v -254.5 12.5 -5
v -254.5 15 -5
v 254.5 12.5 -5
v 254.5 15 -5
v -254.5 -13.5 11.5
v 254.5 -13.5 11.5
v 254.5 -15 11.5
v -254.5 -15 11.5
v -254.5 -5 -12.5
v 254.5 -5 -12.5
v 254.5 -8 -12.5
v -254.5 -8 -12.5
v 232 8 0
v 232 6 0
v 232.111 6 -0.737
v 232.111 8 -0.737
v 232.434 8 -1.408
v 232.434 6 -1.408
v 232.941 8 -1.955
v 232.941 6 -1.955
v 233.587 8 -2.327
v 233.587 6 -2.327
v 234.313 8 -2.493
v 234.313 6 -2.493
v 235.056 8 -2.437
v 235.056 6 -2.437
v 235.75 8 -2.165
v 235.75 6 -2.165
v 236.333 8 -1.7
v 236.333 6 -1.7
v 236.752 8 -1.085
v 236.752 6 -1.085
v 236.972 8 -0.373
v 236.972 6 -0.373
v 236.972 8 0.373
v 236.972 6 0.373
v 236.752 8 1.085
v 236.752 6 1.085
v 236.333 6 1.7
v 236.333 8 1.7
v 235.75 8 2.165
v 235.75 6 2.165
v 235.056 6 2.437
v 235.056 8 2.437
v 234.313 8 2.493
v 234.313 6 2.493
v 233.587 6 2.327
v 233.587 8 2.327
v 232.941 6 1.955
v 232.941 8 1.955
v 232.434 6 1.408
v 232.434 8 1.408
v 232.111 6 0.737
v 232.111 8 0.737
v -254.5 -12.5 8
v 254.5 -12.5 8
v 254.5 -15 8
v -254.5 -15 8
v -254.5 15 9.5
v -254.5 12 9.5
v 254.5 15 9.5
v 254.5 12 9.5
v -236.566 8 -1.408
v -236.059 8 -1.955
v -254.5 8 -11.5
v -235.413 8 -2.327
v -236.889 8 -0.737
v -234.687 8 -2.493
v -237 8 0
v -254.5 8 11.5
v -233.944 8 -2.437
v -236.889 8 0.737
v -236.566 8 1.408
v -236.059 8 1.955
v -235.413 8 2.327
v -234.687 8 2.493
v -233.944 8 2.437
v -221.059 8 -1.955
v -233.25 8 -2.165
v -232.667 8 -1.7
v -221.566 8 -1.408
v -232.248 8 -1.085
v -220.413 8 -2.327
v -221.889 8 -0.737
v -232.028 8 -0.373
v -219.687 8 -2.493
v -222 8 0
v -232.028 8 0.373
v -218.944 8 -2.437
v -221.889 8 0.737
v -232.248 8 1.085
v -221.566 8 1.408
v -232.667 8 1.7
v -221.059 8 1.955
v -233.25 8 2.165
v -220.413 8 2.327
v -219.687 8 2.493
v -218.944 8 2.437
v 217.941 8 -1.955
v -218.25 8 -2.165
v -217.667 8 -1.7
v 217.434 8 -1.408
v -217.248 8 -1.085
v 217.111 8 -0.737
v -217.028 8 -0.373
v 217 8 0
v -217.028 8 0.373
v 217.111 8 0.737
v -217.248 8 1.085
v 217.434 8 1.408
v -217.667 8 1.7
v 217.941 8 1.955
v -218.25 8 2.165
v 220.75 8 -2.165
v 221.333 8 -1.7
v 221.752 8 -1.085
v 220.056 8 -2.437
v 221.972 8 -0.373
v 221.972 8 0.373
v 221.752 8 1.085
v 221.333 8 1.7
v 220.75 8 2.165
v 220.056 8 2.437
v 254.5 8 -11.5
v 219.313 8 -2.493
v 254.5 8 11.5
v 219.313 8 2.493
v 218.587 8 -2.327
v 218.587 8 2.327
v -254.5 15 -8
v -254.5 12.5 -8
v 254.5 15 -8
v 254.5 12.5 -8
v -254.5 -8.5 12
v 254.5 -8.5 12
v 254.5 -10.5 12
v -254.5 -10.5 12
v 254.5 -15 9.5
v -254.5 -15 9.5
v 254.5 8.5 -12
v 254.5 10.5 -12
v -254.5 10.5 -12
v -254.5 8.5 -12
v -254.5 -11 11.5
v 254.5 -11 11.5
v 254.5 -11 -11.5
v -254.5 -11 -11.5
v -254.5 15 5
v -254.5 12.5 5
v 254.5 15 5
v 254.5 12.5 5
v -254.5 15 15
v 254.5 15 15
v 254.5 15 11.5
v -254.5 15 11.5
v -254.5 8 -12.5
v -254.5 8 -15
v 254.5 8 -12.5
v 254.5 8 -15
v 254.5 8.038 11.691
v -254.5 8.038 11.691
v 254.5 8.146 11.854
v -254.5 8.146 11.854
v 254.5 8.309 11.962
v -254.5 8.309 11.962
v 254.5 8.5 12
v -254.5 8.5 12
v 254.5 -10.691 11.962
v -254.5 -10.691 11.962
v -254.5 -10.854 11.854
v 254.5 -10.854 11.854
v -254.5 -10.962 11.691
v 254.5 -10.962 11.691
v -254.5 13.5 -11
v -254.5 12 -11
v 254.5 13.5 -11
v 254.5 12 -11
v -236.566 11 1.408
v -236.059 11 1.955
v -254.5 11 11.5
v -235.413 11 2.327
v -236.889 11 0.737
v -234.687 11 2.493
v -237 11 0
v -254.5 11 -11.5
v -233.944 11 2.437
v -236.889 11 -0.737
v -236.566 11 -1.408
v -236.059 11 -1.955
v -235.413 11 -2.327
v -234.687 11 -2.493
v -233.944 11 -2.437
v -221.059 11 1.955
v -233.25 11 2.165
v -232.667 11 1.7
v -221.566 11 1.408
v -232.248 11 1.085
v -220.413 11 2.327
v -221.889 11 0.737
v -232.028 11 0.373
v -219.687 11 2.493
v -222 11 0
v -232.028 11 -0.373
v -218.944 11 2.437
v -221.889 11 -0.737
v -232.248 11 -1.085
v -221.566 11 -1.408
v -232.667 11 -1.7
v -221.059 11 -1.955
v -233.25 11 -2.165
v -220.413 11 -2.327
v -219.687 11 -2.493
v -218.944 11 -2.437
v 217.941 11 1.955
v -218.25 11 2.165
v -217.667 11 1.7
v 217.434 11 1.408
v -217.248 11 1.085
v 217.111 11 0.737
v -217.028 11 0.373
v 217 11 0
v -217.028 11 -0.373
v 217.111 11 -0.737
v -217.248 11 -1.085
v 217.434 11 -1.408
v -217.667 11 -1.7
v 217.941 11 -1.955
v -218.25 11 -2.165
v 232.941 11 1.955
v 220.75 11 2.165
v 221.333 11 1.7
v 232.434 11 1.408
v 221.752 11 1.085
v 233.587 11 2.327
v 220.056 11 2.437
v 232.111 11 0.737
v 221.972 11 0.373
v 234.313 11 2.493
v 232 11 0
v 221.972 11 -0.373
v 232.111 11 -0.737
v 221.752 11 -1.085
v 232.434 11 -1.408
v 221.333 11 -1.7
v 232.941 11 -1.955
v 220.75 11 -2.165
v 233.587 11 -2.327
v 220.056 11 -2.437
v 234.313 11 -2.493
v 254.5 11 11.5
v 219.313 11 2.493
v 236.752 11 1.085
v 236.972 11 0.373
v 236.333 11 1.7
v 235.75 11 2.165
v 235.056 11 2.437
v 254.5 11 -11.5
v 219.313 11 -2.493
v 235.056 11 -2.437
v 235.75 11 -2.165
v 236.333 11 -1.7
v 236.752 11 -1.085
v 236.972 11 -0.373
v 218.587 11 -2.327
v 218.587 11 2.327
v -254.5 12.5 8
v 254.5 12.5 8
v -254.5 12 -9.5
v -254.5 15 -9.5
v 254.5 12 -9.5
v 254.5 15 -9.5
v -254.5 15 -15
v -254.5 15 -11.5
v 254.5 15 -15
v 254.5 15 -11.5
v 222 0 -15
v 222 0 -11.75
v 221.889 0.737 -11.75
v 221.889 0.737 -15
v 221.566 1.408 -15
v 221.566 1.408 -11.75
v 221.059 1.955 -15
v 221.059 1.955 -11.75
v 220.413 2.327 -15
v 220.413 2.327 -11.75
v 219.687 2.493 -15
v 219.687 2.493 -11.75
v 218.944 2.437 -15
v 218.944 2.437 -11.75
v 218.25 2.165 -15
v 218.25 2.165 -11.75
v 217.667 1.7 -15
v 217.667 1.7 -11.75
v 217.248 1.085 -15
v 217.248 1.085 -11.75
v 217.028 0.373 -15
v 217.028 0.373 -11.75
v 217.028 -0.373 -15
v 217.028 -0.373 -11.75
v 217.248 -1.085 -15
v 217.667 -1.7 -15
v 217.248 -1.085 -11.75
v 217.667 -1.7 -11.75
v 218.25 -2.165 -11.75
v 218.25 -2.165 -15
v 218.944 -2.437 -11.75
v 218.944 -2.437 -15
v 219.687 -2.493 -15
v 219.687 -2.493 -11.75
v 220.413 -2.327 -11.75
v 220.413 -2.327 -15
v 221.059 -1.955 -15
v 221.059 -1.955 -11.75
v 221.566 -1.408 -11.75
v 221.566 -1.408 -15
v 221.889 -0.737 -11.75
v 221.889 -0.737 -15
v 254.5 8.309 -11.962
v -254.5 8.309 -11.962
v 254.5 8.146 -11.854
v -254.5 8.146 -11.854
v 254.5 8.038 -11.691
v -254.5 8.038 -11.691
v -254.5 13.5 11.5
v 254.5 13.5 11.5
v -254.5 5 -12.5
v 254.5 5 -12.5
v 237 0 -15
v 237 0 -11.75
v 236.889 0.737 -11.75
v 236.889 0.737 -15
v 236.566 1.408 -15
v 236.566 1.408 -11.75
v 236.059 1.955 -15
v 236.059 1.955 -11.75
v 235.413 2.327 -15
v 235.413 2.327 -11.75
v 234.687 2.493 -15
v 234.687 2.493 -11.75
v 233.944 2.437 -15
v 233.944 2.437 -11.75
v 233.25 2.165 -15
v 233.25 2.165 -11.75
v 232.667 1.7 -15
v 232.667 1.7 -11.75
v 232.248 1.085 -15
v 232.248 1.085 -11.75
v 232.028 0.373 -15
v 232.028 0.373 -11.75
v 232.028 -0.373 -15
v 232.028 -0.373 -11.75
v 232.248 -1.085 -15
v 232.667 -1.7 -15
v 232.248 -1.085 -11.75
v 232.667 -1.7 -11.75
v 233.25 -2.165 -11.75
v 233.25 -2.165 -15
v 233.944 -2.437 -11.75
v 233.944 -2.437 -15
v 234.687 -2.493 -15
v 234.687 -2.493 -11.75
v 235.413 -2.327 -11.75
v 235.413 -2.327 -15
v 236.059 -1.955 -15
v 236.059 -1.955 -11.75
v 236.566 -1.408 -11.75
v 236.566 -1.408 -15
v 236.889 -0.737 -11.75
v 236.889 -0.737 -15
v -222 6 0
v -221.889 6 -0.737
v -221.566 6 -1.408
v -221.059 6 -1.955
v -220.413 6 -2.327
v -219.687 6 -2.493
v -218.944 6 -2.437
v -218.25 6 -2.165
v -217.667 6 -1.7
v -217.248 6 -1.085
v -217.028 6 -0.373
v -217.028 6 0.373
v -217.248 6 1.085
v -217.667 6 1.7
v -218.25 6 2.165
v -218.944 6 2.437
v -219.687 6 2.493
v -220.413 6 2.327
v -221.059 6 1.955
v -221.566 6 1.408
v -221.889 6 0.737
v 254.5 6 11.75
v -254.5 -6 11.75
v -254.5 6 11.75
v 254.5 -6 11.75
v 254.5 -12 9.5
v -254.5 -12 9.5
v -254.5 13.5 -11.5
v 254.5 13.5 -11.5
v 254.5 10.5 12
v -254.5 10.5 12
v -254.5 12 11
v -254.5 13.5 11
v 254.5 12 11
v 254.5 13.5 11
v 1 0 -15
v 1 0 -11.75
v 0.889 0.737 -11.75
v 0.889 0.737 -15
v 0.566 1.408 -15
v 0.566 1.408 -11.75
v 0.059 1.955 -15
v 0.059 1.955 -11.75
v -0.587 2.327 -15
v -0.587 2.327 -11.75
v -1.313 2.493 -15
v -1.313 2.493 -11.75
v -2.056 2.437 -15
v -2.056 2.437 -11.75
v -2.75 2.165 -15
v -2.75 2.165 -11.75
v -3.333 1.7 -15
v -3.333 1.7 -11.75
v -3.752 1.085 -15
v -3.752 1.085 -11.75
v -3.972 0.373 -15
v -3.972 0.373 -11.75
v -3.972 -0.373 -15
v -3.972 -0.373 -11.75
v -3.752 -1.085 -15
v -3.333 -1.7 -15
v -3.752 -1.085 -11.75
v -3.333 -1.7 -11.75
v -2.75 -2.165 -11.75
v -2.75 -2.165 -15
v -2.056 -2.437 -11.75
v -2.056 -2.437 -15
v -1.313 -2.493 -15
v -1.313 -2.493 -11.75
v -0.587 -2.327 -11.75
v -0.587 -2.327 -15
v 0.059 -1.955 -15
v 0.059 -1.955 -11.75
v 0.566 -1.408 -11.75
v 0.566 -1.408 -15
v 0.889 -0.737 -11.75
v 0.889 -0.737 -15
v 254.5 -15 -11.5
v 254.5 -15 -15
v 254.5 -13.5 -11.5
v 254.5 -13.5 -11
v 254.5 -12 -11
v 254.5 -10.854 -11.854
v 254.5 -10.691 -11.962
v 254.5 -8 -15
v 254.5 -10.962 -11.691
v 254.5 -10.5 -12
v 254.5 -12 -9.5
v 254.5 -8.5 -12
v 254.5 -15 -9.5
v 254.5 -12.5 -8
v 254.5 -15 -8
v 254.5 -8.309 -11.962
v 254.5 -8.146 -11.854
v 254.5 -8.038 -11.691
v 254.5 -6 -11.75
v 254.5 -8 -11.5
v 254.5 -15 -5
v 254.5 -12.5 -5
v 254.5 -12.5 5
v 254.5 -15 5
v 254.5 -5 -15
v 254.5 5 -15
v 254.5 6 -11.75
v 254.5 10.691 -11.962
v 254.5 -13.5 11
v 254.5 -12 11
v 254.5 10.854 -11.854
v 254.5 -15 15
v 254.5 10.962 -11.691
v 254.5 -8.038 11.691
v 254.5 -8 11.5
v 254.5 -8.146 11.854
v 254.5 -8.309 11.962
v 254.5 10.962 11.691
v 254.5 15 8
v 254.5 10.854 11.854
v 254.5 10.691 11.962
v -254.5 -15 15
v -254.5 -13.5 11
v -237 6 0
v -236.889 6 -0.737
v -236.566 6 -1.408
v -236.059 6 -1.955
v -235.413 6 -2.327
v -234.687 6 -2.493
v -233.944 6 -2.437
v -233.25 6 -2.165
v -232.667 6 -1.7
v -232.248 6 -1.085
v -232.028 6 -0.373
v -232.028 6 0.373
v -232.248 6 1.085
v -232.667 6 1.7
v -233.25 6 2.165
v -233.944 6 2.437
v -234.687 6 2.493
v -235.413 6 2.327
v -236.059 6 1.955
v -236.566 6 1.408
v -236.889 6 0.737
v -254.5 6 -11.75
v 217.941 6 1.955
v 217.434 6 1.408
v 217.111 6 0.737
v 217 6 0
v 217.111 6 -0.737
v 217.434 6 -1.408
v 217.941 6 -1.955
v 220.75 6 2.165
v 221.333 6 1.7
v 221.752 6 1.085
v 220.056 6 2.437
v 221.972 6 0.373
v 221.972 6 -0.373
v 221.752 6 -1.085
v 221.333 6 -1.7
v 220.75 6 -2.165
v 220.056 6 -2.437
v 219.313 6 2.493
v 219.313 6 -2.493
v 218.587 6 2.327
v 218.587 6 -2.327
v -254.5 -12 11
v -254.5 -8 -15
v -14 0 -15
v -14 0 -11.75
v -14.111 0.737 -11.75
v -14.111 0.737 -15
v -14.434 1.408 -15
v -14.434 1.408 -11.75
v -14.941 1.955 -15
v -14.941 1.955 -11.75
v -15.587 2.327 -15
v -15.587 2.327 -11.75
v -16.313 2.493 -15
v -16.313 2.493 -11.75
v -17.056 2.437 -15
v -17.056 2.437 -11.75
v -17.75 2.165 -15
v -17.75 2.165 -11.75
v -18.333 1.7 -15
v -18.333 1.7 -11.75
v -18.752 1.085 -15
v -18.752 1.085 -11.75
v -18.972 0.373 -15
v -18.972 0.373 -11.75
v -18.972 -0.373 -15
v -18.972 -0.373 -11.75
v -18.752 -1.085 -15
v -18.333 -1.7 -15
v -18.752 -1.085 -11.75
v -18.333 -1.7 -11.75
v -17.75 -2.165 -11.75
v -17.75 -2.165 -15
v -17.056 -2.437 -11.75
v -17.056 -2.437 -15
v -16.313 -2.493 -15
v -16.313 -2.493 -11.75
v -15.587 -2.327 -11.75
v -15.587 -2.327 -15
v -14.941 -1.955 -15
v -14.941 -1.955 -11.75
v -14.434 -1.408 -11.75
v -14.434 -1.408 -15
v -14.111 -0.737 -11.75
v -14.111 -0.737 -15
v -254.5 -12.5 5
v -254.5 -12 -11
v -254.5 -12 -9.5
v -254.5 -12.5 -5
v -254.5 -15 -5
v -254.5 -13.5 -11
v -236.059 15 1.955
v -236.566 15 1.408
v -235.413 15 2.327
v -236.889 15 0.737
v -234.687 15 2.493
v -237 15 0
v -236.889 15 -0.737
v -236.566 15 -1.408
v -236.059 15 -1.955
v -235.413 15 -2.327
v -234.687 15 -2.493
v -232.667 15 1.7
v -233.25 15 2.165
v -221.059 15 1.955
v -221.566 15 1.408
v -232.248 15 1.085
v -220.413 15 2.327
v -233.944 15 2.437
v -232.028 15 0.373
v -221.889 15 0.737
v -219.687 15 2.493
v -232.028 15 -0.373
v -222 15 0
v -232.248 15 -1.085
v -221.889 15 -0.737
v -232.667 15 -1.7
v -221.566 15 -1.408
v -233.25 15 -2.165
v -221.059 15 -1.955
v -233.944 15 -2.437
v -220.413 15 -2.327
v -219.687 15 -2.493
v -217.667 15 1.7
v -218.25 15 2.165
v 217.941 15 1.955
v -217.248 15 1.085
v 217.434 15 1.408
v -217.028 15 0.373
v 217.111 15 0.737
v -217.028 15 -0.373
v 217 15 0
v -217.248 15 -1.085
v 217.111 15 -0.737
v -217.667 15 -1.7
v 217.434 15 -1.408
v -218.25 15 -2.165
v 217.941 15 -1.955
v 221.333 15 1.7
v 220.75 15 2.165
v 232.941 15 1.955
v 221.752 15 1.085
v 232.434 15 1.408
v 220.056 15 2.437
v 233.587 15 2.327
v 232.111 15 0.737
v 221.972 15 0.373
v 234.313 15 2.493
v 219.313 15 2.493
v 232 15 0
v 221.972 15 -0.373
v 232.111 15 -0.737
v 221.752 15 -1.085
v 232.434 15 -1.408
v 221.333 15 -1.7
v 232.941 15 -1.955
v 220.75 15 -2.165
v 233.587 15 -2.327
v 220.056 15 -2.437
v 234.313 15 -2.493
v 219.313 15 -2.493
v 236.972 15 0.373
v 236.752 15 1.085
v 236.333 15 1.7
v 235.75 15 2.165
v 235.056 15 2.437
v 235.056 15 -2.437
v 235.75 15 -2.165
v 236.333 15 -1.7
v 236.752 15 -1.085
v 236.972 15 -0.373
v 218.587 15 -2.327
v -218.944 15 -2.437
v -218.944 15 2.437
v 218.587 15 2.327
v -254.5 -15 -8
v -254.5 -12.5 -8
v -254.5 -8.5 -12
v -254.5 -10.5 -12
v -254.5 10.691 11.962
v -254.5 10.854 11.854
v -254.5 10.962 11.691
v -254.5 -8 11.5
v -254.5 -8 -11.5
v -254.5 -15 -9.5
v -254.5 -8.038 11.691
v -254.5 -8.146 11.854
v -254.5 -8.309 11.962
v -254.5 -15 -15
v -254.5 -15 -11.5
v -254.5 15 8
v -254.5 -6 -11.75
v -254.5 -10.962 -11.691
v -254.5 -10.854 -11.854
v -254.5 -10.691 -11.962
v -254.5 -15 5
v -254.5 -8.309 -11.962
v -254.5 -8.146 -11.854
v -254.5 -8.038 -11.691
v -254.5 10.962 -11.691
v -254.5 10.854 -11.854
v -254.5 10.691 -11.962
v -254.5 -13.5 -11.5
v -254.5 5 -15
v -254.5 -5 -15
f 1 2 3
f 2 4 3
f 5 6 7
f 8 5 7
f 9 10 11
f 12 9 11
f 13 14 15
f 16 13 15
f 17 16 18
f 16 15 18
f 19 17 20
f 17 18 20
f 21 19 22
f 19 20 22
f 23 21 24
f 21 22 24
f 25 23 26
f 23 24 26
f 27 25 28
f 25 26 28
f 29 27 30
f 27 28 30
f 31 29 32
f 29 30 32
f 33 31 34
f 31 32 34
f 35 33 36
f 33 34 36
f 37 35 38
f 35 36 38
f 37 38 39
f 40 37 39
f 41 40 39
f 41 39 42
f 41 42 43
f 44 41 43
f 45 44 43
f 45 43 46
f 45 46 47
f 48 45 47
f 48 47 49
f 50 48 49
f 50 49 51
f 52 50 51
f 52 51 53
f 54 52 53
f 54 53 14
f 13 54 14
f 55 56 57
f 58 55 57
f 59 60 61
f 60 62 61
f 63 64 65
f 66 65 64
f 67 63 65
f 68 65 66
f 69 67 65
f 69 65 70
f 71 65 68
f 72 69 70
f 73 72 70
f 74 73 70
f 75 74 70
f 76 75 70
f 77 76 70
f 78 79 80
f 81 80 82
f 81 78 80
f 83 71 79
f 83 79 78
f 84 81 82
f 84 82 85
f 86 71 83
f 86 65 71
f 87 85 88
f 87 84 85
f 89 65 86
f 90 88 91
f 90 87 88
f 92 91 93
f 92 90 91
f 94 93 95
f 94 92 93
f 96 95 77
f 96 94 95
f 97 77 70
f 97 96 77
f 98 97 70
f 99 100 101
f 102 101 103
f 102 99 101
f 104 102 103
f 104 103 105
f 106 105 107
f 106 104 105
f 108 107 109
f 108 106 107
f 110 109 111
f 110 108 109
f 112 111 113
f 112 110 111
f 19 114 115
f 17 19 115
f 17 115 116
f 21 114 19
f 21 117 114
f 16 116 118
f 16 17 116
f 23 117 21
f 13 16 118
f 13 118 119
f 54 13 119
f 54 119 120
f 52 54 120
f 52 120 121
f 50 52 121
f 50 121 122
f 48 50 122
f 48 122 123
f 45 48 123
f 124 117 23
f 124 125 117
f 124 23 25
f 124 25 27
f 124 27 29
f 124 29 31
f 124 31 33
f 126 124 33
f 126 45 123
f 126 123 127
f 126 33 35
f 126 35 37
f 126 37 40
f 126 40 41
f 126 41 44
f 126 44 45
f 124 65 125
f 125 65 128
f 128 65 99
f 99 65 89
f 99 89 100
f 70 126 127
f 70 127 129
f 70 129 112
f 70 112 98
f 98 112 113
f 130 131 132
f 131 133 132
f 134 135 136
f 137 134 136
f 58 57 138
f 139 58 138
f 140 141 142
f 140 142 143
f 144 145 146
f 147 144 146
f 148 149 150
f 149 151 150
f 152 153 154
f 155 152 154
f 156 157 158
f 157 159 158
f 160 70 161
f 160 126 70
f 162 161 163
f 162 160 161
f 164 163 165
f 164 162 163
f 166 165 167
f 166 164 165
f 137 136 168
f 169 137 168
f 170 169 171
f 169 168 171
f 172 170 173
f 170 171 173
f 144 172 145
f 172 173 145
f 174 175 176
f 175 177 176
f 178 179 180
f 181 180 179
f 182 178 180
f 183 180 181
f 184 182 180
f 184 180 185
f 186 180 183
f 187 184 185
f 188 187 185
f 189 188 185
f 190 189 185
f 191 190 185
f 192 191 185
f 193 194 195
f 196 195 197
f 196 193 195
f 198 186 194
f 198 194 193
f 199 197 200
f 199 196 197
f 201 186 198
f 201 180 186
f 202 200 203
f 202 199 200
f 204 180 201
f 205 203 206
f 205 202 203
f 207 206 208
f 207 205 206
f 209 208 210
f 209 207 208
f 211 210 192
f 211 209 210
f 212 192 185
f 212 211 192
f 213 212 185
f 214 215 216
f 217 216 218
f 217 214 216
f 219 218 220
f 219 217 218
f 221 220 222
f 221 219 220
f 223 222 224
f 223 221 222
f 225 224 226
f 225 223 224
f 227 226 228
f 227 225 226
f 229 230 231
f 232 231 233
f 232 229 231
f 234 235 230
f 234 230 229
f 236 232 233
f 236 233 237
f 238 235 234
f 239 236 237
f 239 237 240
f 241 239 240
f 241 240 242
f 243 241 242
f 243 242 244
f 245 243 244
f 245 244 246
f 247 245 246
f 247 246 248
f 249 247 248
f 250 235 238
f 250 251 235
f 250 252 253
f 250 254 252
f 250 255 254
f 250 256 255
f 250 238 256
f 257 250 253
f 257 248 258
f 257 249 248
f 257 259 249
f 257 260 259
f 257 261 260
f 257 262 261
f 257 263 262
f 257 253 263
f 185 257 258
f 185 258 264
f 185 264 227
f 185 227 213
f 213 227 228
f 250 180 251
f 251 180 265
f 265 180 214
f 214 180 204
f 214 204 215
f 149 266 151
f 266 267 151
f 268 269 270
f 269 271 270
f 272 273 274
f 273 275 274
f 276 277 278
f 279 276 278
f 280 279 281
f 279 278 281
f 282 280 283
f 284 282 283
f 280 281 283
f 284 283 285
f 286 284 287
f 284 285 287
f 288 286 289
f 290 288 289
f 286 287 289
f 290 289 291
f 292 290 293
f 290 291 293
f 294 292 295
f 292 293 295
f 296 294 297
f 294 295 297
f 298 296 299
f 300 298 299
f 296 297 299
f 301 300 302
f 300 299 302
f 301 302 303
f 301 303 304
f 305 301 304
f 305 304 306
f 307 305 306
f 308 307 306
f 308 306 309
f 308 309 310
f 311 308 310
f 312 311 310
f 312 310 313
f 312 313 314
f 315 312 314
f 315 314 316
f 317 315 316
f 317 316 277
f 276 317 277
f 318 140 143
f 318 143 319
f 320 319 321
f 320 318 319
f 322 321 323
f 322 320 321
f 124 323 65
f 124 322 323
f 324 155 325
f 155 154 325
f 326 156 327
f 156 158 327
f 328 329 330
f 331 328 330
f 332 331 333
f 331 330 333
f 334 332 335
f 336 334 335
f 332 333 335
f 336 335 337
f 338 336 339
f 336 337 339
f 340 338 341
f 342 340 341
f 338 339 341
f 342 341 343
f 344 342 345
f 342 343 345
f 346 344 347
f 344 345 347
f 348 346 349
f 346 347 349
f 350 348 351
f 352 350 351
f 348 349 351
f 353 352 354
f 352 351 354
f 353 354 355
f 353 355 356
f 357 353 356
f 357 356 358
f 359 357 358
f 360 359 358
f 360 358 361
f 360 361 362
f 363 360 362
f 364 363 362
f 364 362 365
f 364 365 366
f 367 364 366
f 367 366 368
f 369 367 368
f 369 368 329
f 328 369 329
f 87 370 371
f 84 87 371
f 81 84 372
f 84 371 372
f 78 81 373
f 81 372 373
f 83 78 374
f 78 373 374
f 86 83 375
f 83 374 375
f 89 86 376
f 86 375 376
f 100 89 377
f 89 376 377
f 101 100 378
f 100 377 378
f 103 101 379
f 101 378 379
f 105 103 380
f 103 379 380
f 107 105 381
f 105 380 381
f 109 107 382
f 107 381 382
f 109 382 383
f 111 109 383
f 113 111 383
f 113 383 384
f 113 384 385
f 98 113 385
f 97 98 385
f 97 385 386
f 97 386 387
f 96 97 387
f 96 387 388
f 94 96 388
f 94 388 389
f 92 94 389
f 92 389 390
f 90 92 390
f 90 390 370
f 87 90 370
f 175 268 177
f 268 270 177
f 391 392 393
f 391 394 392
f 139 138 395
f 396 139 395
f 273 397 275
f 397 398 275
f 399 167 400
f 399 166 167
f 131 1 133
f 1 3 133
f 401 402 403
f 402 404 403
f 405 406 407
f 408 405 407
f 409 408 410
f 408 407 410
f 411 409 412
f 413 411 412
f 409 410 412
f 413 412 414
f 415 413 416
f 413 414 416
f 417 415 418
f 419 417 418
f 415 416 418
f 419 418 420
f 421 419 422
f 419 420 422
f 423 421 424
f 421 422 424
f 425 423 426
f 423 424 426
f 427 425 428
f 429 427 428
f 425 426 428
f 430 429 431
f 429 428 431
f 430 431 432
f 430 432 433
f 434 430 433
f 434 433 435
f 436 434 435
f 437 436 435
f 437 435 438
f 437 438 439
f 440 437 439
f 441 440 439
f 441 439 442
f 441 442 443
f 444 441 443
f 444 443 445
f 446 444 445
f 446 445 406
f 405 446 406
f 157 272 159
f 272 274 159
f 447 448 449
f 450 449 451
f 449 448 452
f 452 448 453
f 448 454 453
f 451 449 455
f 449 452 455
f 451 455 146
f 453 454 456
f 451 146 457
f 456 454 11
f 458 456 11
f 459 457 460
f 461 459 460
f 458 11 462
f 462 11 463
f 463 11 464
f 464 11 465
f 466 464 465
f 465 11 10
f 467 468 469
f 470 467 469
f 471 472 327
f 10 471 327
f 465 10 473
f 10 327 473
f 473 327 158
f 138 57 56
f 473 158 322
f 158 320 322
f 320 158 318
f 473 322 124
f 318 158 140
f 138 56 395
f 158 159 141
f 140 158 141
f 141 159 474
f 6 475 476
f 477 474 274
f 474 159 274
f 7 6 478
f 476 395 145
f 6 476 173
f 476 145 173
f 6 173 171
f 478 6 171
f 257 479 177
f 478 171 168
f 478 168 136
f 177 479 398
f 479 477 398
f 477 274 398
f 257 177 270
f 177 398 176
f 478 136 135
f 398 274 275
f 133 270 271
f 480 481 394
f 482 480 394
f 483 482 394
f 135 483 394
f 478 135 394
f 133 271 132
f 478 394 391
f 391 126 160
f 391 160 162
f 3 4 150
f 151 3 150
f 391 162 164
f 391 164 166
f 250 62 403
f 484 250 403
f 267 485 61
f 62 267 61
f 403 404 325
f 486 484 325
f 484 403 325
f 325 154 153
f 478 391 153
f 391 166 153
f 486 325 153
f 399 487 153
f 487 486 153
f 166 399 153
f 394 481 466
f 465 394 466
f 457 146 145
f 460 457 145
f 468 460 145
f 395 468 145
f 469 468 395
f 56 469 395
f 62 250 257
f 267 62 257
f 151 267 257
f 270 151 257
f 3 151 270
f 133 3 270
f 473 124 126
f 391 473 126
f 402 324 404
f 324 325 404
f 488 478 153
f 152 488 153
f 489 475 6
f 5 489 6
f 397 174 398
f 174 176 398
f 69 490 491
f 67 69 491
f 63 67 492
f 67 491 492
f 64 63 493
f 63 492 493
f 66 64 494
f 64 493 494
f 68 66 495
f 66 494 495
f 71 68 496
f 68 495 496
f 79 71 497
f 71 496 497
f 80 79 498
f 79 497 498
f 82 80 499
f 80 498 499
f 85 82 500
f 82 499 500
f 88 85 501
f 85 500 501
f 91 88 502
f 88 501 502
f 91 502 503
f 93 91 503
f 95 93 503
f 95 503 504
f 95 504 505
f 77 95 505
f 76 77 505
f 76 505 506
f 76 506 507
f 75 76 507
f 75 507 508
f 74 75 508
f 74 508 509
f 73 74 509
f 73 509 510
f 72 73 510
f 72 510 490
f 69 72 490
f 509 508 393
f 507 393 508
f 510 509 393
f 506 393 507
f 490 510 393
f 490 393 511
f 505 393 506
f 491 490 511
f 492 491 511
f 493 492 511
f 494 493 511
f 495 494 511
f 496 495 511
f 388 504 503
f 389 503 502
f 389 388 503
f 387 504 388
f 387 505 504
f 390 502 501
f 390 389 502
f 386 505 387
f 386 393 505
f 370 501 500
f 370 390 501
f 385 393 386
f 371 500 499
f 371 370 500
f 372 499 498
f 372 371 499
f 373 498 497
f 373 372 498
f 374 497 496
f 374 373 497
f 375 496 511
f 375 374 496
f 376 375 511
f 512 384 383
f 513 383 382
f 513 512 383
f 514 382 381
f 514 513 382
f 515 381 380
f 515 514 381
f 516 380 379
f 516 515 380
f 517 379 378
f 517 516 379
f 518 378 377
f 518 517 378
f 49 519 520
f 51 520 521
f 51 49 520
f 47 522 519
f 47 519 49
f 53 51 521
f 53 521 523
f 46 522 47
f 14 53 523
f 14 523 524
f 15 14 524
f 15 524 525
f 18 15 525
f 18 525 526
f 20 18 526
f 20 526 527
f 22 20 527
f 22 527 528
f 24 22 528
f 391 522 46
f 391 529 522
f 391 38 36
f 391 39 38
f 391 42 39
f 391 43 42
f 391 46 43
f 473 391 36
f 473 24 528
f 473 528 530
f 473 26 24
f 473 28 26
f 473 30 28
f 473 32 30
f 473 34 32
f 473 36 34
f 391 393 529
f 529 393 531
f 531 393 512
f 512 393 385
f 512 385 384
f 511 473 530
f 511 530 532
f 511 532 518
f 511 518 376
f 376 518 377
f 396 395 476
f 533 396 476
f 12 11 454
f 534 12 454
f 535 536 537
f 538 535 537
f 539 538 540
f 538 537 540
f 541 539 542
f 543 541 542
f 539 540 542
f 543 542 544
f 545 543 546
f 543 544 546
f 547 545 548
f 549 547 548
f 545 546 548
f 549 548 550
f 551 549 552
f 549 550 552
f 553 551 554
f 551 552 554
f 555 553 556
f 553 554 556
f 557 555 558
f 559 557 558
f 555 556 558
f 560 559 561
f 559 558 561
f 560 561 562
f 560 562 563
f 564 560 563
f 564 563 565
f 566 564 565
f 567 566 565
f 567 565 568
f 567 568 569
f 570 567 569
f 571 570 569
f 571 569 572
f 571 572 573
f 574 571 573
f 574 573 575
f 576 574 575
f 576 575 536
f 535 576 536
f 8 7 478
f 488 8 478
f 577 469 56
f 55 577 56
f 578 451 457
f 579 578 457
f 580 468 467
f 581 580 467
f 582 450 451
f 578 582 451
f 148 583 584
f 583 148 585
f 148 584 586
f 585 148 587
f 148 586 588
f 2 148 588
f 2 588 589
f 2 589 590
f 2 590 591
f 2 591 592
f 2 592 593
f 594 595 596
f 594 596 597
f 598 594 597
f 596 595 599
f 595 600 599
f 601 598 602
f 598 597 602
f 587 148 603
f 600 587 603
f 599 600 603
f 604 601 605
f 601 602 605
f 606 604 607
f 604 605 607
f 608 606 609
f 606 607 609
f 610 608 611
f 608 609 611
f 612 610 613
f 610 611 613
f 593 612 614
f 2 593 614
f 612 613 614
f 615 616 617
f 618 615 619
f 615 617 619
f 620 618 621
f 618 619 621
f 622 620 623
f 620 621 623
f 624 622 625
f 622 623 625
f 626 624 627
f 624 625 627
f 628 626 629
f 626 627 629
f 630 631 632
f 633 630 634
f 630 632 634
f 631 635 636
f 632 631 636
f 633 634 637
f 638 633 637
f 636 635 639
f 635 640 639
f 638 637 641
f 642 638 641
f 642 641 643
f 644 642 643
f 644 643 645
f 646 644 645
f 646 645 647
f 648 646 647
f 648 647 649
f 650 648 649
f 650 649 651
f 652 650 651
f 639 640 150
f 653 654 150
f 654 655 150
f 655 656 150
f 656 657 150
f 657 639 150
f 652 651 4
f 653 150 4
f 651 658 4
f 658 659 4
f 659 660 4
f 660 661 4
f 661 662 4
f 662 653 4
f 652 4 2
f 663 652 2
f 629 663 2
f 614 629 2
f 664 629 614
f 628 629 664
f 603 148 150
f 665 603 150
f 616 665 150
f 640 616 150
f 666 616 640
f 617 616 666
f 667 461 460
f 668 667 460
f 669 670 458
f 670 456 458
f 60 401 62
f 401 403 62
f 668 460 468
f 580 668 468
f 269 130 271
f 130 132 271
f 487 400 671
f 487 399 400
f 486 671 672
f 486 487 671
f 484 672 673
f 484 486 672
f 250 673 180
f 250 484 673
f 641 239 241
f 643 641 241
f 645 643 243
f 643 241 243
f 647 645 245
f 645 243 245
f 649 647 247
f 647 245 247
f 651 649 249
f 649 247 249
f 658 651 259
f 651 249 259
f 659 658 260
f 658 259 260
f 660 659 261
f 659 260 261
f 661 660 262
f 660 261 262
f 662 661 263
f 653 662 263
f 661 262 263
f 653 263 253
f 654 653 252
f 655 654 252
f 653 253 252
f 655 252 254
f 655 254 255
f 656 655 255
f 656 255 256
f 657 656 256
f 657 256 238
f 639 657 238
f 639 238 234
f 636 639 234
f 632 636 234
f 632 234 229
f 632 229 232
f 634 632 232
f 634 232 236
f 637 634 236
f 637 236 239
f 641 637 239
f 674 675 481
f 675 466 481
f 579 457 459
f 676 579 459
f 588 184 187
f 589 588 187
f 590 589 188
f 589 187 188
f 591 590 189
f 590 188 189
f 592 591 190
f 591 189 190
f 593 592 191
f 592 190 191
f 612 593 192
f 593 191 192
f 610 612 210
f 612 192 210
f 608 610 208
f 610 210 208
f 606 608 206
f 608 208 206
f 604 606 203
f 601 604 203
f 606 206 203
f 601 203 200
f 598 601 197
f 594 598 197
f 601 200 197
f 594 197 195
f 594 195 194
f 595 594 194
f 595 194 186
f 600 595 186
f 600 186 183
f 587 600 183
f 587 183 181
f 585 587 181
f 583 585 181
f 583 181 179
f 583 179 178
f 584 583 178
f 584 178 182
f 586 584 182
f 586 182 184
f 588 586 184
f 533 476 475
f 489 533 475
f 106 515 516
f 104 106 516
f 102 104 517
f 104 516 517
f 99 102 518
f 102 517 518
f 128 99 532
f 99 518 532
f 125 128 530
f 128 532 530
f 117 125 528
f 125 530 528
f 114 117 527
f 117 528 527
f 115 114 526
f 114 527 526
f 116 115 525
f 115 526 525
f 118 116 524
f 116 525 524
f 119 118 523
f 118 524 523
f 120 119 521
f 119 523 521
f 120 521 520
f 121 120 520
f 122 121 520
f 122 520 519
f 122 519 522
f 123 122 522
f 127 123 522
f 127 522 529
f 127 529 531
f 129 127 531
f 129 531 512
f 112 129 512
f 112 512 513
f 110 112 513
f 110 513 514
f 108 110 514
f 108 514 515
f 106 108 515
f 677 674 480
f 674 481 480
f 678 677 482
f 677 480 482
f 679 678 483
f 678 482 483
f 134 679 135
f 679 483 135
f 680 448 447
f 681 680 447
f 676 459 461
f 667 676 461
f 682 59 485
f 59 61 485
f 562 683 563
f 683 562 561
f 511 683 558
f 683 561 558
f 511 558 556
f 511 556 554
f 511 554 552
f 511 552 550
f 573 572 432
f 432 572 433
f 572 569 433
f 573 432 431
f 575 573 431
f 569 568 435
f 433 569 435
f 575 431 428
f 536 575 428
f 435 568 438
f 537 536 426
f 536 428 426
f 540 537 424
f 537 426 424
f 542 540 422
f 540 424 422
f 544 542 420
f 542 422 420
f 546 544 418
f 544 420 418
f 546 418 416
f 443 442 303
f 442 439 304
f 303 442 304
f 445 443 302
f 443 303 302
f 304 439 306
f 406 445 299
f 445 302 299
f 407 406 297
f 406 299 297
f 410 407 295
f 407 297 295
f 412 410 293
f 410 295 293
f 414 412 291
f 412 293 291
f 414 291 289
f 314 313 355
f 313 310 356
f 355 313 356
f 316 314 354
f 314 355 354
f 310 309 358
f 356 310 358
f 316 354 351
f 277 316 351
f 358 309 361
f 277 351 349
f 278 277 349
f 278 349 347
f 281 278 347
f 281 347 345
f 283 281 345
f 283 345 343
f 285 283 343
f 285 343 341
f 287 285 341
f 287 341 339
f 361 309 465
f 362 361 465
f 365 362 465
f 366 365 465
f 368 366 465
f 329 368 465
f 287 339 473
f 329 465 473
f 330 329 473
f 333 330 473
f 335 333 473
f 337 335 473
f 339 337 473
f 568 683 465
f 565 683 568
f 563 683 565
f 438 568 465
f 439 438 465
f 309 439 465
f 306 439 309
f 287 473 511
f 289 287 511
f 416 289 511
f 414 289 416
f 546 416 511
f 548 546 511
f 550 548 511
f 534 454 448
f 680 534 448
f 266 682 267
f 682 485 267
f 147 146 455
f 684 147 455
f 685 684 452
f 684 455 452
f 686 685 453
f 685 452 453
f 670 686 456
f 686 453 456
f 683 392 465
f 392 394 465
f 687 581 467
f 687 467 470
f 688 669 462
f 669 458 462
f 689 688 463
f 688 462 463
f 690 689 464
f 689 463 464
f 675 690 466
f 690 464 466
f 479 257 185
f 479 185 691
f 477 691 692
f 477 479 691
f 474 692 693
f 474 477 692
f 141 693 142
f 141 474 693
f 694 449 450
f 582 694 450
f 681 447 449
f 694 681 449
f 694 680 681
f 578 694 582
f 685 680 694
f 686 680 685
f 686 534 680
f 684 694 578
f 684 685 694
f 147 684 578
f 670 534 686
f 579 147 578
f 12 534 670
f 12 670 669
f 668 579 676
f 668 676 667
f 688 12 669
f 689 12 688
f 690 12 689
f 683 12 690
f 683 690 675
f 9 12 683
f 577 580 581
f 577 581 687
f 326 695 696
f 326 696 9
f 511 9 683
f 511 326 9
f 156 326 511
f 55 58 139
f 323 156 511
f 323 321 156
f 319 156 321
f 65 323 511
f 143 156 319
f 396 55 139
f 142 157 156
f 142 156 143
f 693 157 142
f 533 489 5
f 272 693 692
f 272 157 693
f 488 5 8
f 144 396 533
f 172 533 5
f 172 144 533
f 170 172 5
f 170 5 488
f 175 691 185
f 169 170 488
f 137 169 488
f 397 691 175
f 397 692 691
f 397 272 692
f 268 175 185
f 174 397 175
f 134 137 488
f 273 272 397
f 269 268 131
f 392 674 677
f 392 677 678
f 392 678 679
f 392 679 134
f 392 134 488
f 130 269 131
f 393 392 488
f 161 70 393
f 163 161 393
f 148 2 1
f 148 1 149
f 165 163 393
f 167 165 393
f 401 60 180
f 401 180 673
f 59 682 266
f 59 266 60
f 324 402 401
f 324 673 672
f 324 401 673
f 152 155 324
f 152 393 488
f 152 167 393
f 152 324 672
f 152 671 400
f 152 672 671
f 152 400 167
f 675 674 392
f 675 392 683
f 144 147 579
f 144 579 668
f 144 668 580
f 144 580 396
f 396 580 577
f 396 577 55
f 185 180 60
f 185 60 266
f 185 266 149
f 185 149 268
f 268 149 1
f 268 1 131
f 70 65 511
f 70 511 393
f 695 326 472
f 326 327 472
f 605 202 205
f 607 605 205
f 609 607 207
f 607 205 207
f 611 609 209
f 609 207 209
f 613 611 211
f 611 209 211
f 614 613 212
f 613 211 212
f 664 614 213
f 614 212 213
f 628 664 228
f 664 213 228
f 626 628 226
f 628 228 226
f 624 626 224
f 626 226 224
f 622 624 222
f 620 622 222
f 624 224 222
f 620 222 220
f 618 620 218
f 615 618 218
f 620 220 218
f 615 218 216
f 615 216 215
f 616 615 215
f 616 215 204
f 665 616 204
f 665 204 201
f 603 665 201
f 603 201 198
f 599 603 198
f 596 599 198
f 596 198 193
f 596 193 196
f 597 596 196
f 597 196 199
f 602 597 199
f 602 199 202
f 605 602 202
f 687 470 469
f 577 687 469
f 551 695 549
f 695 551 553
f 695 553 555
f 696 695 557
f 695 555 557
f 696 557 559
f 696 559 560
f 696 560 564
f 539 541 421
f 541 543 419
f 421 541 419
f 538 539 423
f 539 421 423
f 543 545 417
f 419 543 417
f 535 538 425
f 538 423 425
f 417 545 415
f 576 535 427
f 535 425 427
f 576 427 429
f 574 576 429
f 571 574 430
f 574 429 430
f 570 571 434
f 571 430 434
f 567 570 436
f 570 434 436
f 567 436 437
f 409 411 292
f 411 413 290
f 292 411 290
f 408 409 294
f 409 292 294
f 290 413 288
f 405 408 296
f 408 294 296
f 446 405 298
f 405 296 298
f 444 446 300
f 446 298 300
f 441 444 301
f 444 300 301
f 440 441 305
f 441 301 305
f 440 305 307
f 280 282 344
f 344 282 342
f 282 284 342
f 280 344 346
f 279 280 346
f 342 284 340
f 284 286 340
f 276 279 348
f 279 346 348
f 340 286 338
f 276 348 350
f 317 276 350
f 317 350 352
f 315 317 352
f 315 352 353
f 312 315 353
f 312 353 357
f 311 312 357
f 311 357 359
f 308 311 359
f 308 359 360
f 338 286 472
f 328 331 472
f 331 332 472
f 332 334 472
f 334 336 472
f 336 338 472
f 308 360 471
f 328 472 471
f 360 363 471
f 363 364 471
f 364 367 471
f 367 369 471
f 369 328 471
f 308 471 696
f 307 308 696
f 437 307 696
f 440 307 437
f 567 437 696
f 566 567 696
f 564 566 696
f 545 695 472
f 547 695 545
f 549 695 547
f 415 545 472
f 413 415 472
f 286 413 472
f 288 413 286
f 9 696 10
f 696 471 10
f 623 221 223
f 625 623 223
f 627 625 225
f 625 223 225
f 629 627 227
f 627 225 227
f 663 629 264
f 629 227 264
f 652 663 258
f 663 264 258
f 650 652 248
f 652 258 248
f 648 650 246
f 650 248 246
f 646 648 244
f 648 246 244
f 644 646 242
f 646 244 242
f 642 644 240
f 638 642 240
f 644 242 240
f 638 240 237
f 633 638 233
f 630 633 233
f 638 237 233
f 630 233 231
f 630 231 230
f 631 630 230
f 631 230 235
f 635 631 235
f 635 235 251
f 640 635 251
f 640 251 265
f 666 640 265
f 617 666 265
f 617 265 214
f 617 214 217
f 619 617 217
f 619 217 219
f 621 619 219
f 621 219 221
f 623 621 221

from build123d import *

# Parameters (mm, degrees)
SKETCH_1_W             = 23.5
SKETCH_1_H             = 12
EXTRUDE_1_DEPTH        = 254.5
HOLE_WIZARD_M6_1_D     = 5
HOLE_WIZARD_M6_1_DEPTH = 19
HOLE_WIZARD_M6_1_TIP   = 1.502151548
HOLE_WIZARD_M6_2_D     = 5
HOLE_WIZARD_M6_2_DEPTH = 19
HOLE_WIZARD_M6_2_TIP   = 1.502151548


with BuildPart() as part:
    # 草图1 → 凸台-拉伸1 (new, symmetric)
    with BuildSketch(Plane(origin=(0, 0, 0), x_dir=(0, 0, -1), z_dir=(1, 0, 0))):
        Polygon((-15, 15), (-11.5, 15), (-11.5, 13.5), (-11, 13.5), (-11, 12), (-9.5, 12), (-9.5, 15), (-8, 15), (-8, 12.5), (-5, 12.5), (-5, 15), (5, 15), (5, 12.5), (8, 12.5), (8, 15), (9.5, 15), (9.5, 12), (11, 12), (11, 13.5), (11.5, 13.5), (11.5, 15), (15, 15), (15, 8), (12.5, 8), (12.5, 5), (15, 5), (15, -5), (12.5, -5), (12.5, -8), (15, -8), (15, -15), (11.5, -15), (11.5, -13.5), (11, -13.5), (11, -12), (9.5, -12), (9.5, -15), (8, -15), (8, -12.5), (5, -12.5), (5, -15), (-5, -15), (-5, -12.5), (-8, -12.5), (-8, -15), (-9.5, -15), (-9.5, -12), (-11, -12), (-11, -13.5), (-11.5, -13.5), (-11.5, -15), (-15, -15), align=None)
        with BuildLine():
            Line((12, -10.5), (12, -8.5))
            ThreePointArc((12, -8.5), (11.853553391, -8.146446609), (11.5, -8))
            Line((11.5, -8), (-11.5, -8))
            ThreePointArc((-11.5, -8), (-11.853553391, -8.146446609), (-12, -8.5))
            Line((-12, -8.5), (-12, -10.5))
            ThreePointArc((-12, -10.5), (-11.853553391, -10.853553391), (-11.5, -11))
            Line((-11.5, -11), (11.5, -11))
            ThreePointArc((11.5, -11), (11.853553391, -10.853553391), (12, -10.5))
        make_face(mode=Mode.SUBTRACT)
        with BuildLine():
            Line((-11.5, 11), (11.5, 11))
            ThreePointArc((11.5, 11), (11.853553391, 10.853553391), (12, 10.5))
            Line((12, 10.5), (12, 8.5))
            ThreePointArc((12, 8.5), (11.853553391, 8.146446609), (11.5, 8))
            Line((11.5, 8), (-11.5, 8))
            ThreePointArc((-11.5, 8), (-11.853553391, 8.146446609), (-12, 8.5))
            Line((-12, 8.5), (-12, 10.5))
            ThreePointArc((-12, 10.5), (-11.853553391, 10.853553391), (-11.5, 11))
        make_face(mode=Mode.SUBTRACT)
        Rectangle(SKETCH_1_W, SKETCH_1_H, mode=Mode.SUBTRACT)
    extrude(amount=EXTRUDE_1_DEPTH, both=True)

    # M6 螺纹孔1
    with Locations(Plane(origin=(0, 0, -15), x_dir=(-1, 0, 0), z_dir=(0, 0, -1))):
        with Locations((-234.5, 0), (-219.5, 0), (1.5, 0), (16.5, 0)):
            Hole(HOLE_WIZARD_M6_1_D / 2, depth=HOLE_WIZARD_M6_1_DEPTH)
            with Locations((0, 0, -(HOLE_WIZARD_M6_1_DEPTH + HOLE_WIZARD_M6_1_TIP / 2))):  # 118° drill point
                Cone(0, HOLE_WIZARD_M6_1_D / 2, HOLE_WIZARD_M6_1_TIP, mode=Mode.SUBTRACT)

    # M6 螺纹孔2
    with Locations(Plane(origin=(0, 15, 0), x_dir=(1, 0, 0), z_dir=(0, 1, 0))):
        with Locations((234.5, 0), (219.5, 0), (-219.5, 0), (-234.5, 0)):
            Hole(HOLE_WIZARD_M6_2_D / 2, depth=HOLE_WIZARD_M6_2_DEPTH)
            with Locations((0, 0, -(HOLE_WIZARD_M6_2_DEPTH + HOLE_WIZARD_M6_2_TIP / 2))):  # 118° drill point
                Cone(0, HOLE_WIZARD_M6_2_D / 2, HOLE_WIZARD_M6_2_TIP, mode=Mode.SUBTRACT)


solid = part.part
